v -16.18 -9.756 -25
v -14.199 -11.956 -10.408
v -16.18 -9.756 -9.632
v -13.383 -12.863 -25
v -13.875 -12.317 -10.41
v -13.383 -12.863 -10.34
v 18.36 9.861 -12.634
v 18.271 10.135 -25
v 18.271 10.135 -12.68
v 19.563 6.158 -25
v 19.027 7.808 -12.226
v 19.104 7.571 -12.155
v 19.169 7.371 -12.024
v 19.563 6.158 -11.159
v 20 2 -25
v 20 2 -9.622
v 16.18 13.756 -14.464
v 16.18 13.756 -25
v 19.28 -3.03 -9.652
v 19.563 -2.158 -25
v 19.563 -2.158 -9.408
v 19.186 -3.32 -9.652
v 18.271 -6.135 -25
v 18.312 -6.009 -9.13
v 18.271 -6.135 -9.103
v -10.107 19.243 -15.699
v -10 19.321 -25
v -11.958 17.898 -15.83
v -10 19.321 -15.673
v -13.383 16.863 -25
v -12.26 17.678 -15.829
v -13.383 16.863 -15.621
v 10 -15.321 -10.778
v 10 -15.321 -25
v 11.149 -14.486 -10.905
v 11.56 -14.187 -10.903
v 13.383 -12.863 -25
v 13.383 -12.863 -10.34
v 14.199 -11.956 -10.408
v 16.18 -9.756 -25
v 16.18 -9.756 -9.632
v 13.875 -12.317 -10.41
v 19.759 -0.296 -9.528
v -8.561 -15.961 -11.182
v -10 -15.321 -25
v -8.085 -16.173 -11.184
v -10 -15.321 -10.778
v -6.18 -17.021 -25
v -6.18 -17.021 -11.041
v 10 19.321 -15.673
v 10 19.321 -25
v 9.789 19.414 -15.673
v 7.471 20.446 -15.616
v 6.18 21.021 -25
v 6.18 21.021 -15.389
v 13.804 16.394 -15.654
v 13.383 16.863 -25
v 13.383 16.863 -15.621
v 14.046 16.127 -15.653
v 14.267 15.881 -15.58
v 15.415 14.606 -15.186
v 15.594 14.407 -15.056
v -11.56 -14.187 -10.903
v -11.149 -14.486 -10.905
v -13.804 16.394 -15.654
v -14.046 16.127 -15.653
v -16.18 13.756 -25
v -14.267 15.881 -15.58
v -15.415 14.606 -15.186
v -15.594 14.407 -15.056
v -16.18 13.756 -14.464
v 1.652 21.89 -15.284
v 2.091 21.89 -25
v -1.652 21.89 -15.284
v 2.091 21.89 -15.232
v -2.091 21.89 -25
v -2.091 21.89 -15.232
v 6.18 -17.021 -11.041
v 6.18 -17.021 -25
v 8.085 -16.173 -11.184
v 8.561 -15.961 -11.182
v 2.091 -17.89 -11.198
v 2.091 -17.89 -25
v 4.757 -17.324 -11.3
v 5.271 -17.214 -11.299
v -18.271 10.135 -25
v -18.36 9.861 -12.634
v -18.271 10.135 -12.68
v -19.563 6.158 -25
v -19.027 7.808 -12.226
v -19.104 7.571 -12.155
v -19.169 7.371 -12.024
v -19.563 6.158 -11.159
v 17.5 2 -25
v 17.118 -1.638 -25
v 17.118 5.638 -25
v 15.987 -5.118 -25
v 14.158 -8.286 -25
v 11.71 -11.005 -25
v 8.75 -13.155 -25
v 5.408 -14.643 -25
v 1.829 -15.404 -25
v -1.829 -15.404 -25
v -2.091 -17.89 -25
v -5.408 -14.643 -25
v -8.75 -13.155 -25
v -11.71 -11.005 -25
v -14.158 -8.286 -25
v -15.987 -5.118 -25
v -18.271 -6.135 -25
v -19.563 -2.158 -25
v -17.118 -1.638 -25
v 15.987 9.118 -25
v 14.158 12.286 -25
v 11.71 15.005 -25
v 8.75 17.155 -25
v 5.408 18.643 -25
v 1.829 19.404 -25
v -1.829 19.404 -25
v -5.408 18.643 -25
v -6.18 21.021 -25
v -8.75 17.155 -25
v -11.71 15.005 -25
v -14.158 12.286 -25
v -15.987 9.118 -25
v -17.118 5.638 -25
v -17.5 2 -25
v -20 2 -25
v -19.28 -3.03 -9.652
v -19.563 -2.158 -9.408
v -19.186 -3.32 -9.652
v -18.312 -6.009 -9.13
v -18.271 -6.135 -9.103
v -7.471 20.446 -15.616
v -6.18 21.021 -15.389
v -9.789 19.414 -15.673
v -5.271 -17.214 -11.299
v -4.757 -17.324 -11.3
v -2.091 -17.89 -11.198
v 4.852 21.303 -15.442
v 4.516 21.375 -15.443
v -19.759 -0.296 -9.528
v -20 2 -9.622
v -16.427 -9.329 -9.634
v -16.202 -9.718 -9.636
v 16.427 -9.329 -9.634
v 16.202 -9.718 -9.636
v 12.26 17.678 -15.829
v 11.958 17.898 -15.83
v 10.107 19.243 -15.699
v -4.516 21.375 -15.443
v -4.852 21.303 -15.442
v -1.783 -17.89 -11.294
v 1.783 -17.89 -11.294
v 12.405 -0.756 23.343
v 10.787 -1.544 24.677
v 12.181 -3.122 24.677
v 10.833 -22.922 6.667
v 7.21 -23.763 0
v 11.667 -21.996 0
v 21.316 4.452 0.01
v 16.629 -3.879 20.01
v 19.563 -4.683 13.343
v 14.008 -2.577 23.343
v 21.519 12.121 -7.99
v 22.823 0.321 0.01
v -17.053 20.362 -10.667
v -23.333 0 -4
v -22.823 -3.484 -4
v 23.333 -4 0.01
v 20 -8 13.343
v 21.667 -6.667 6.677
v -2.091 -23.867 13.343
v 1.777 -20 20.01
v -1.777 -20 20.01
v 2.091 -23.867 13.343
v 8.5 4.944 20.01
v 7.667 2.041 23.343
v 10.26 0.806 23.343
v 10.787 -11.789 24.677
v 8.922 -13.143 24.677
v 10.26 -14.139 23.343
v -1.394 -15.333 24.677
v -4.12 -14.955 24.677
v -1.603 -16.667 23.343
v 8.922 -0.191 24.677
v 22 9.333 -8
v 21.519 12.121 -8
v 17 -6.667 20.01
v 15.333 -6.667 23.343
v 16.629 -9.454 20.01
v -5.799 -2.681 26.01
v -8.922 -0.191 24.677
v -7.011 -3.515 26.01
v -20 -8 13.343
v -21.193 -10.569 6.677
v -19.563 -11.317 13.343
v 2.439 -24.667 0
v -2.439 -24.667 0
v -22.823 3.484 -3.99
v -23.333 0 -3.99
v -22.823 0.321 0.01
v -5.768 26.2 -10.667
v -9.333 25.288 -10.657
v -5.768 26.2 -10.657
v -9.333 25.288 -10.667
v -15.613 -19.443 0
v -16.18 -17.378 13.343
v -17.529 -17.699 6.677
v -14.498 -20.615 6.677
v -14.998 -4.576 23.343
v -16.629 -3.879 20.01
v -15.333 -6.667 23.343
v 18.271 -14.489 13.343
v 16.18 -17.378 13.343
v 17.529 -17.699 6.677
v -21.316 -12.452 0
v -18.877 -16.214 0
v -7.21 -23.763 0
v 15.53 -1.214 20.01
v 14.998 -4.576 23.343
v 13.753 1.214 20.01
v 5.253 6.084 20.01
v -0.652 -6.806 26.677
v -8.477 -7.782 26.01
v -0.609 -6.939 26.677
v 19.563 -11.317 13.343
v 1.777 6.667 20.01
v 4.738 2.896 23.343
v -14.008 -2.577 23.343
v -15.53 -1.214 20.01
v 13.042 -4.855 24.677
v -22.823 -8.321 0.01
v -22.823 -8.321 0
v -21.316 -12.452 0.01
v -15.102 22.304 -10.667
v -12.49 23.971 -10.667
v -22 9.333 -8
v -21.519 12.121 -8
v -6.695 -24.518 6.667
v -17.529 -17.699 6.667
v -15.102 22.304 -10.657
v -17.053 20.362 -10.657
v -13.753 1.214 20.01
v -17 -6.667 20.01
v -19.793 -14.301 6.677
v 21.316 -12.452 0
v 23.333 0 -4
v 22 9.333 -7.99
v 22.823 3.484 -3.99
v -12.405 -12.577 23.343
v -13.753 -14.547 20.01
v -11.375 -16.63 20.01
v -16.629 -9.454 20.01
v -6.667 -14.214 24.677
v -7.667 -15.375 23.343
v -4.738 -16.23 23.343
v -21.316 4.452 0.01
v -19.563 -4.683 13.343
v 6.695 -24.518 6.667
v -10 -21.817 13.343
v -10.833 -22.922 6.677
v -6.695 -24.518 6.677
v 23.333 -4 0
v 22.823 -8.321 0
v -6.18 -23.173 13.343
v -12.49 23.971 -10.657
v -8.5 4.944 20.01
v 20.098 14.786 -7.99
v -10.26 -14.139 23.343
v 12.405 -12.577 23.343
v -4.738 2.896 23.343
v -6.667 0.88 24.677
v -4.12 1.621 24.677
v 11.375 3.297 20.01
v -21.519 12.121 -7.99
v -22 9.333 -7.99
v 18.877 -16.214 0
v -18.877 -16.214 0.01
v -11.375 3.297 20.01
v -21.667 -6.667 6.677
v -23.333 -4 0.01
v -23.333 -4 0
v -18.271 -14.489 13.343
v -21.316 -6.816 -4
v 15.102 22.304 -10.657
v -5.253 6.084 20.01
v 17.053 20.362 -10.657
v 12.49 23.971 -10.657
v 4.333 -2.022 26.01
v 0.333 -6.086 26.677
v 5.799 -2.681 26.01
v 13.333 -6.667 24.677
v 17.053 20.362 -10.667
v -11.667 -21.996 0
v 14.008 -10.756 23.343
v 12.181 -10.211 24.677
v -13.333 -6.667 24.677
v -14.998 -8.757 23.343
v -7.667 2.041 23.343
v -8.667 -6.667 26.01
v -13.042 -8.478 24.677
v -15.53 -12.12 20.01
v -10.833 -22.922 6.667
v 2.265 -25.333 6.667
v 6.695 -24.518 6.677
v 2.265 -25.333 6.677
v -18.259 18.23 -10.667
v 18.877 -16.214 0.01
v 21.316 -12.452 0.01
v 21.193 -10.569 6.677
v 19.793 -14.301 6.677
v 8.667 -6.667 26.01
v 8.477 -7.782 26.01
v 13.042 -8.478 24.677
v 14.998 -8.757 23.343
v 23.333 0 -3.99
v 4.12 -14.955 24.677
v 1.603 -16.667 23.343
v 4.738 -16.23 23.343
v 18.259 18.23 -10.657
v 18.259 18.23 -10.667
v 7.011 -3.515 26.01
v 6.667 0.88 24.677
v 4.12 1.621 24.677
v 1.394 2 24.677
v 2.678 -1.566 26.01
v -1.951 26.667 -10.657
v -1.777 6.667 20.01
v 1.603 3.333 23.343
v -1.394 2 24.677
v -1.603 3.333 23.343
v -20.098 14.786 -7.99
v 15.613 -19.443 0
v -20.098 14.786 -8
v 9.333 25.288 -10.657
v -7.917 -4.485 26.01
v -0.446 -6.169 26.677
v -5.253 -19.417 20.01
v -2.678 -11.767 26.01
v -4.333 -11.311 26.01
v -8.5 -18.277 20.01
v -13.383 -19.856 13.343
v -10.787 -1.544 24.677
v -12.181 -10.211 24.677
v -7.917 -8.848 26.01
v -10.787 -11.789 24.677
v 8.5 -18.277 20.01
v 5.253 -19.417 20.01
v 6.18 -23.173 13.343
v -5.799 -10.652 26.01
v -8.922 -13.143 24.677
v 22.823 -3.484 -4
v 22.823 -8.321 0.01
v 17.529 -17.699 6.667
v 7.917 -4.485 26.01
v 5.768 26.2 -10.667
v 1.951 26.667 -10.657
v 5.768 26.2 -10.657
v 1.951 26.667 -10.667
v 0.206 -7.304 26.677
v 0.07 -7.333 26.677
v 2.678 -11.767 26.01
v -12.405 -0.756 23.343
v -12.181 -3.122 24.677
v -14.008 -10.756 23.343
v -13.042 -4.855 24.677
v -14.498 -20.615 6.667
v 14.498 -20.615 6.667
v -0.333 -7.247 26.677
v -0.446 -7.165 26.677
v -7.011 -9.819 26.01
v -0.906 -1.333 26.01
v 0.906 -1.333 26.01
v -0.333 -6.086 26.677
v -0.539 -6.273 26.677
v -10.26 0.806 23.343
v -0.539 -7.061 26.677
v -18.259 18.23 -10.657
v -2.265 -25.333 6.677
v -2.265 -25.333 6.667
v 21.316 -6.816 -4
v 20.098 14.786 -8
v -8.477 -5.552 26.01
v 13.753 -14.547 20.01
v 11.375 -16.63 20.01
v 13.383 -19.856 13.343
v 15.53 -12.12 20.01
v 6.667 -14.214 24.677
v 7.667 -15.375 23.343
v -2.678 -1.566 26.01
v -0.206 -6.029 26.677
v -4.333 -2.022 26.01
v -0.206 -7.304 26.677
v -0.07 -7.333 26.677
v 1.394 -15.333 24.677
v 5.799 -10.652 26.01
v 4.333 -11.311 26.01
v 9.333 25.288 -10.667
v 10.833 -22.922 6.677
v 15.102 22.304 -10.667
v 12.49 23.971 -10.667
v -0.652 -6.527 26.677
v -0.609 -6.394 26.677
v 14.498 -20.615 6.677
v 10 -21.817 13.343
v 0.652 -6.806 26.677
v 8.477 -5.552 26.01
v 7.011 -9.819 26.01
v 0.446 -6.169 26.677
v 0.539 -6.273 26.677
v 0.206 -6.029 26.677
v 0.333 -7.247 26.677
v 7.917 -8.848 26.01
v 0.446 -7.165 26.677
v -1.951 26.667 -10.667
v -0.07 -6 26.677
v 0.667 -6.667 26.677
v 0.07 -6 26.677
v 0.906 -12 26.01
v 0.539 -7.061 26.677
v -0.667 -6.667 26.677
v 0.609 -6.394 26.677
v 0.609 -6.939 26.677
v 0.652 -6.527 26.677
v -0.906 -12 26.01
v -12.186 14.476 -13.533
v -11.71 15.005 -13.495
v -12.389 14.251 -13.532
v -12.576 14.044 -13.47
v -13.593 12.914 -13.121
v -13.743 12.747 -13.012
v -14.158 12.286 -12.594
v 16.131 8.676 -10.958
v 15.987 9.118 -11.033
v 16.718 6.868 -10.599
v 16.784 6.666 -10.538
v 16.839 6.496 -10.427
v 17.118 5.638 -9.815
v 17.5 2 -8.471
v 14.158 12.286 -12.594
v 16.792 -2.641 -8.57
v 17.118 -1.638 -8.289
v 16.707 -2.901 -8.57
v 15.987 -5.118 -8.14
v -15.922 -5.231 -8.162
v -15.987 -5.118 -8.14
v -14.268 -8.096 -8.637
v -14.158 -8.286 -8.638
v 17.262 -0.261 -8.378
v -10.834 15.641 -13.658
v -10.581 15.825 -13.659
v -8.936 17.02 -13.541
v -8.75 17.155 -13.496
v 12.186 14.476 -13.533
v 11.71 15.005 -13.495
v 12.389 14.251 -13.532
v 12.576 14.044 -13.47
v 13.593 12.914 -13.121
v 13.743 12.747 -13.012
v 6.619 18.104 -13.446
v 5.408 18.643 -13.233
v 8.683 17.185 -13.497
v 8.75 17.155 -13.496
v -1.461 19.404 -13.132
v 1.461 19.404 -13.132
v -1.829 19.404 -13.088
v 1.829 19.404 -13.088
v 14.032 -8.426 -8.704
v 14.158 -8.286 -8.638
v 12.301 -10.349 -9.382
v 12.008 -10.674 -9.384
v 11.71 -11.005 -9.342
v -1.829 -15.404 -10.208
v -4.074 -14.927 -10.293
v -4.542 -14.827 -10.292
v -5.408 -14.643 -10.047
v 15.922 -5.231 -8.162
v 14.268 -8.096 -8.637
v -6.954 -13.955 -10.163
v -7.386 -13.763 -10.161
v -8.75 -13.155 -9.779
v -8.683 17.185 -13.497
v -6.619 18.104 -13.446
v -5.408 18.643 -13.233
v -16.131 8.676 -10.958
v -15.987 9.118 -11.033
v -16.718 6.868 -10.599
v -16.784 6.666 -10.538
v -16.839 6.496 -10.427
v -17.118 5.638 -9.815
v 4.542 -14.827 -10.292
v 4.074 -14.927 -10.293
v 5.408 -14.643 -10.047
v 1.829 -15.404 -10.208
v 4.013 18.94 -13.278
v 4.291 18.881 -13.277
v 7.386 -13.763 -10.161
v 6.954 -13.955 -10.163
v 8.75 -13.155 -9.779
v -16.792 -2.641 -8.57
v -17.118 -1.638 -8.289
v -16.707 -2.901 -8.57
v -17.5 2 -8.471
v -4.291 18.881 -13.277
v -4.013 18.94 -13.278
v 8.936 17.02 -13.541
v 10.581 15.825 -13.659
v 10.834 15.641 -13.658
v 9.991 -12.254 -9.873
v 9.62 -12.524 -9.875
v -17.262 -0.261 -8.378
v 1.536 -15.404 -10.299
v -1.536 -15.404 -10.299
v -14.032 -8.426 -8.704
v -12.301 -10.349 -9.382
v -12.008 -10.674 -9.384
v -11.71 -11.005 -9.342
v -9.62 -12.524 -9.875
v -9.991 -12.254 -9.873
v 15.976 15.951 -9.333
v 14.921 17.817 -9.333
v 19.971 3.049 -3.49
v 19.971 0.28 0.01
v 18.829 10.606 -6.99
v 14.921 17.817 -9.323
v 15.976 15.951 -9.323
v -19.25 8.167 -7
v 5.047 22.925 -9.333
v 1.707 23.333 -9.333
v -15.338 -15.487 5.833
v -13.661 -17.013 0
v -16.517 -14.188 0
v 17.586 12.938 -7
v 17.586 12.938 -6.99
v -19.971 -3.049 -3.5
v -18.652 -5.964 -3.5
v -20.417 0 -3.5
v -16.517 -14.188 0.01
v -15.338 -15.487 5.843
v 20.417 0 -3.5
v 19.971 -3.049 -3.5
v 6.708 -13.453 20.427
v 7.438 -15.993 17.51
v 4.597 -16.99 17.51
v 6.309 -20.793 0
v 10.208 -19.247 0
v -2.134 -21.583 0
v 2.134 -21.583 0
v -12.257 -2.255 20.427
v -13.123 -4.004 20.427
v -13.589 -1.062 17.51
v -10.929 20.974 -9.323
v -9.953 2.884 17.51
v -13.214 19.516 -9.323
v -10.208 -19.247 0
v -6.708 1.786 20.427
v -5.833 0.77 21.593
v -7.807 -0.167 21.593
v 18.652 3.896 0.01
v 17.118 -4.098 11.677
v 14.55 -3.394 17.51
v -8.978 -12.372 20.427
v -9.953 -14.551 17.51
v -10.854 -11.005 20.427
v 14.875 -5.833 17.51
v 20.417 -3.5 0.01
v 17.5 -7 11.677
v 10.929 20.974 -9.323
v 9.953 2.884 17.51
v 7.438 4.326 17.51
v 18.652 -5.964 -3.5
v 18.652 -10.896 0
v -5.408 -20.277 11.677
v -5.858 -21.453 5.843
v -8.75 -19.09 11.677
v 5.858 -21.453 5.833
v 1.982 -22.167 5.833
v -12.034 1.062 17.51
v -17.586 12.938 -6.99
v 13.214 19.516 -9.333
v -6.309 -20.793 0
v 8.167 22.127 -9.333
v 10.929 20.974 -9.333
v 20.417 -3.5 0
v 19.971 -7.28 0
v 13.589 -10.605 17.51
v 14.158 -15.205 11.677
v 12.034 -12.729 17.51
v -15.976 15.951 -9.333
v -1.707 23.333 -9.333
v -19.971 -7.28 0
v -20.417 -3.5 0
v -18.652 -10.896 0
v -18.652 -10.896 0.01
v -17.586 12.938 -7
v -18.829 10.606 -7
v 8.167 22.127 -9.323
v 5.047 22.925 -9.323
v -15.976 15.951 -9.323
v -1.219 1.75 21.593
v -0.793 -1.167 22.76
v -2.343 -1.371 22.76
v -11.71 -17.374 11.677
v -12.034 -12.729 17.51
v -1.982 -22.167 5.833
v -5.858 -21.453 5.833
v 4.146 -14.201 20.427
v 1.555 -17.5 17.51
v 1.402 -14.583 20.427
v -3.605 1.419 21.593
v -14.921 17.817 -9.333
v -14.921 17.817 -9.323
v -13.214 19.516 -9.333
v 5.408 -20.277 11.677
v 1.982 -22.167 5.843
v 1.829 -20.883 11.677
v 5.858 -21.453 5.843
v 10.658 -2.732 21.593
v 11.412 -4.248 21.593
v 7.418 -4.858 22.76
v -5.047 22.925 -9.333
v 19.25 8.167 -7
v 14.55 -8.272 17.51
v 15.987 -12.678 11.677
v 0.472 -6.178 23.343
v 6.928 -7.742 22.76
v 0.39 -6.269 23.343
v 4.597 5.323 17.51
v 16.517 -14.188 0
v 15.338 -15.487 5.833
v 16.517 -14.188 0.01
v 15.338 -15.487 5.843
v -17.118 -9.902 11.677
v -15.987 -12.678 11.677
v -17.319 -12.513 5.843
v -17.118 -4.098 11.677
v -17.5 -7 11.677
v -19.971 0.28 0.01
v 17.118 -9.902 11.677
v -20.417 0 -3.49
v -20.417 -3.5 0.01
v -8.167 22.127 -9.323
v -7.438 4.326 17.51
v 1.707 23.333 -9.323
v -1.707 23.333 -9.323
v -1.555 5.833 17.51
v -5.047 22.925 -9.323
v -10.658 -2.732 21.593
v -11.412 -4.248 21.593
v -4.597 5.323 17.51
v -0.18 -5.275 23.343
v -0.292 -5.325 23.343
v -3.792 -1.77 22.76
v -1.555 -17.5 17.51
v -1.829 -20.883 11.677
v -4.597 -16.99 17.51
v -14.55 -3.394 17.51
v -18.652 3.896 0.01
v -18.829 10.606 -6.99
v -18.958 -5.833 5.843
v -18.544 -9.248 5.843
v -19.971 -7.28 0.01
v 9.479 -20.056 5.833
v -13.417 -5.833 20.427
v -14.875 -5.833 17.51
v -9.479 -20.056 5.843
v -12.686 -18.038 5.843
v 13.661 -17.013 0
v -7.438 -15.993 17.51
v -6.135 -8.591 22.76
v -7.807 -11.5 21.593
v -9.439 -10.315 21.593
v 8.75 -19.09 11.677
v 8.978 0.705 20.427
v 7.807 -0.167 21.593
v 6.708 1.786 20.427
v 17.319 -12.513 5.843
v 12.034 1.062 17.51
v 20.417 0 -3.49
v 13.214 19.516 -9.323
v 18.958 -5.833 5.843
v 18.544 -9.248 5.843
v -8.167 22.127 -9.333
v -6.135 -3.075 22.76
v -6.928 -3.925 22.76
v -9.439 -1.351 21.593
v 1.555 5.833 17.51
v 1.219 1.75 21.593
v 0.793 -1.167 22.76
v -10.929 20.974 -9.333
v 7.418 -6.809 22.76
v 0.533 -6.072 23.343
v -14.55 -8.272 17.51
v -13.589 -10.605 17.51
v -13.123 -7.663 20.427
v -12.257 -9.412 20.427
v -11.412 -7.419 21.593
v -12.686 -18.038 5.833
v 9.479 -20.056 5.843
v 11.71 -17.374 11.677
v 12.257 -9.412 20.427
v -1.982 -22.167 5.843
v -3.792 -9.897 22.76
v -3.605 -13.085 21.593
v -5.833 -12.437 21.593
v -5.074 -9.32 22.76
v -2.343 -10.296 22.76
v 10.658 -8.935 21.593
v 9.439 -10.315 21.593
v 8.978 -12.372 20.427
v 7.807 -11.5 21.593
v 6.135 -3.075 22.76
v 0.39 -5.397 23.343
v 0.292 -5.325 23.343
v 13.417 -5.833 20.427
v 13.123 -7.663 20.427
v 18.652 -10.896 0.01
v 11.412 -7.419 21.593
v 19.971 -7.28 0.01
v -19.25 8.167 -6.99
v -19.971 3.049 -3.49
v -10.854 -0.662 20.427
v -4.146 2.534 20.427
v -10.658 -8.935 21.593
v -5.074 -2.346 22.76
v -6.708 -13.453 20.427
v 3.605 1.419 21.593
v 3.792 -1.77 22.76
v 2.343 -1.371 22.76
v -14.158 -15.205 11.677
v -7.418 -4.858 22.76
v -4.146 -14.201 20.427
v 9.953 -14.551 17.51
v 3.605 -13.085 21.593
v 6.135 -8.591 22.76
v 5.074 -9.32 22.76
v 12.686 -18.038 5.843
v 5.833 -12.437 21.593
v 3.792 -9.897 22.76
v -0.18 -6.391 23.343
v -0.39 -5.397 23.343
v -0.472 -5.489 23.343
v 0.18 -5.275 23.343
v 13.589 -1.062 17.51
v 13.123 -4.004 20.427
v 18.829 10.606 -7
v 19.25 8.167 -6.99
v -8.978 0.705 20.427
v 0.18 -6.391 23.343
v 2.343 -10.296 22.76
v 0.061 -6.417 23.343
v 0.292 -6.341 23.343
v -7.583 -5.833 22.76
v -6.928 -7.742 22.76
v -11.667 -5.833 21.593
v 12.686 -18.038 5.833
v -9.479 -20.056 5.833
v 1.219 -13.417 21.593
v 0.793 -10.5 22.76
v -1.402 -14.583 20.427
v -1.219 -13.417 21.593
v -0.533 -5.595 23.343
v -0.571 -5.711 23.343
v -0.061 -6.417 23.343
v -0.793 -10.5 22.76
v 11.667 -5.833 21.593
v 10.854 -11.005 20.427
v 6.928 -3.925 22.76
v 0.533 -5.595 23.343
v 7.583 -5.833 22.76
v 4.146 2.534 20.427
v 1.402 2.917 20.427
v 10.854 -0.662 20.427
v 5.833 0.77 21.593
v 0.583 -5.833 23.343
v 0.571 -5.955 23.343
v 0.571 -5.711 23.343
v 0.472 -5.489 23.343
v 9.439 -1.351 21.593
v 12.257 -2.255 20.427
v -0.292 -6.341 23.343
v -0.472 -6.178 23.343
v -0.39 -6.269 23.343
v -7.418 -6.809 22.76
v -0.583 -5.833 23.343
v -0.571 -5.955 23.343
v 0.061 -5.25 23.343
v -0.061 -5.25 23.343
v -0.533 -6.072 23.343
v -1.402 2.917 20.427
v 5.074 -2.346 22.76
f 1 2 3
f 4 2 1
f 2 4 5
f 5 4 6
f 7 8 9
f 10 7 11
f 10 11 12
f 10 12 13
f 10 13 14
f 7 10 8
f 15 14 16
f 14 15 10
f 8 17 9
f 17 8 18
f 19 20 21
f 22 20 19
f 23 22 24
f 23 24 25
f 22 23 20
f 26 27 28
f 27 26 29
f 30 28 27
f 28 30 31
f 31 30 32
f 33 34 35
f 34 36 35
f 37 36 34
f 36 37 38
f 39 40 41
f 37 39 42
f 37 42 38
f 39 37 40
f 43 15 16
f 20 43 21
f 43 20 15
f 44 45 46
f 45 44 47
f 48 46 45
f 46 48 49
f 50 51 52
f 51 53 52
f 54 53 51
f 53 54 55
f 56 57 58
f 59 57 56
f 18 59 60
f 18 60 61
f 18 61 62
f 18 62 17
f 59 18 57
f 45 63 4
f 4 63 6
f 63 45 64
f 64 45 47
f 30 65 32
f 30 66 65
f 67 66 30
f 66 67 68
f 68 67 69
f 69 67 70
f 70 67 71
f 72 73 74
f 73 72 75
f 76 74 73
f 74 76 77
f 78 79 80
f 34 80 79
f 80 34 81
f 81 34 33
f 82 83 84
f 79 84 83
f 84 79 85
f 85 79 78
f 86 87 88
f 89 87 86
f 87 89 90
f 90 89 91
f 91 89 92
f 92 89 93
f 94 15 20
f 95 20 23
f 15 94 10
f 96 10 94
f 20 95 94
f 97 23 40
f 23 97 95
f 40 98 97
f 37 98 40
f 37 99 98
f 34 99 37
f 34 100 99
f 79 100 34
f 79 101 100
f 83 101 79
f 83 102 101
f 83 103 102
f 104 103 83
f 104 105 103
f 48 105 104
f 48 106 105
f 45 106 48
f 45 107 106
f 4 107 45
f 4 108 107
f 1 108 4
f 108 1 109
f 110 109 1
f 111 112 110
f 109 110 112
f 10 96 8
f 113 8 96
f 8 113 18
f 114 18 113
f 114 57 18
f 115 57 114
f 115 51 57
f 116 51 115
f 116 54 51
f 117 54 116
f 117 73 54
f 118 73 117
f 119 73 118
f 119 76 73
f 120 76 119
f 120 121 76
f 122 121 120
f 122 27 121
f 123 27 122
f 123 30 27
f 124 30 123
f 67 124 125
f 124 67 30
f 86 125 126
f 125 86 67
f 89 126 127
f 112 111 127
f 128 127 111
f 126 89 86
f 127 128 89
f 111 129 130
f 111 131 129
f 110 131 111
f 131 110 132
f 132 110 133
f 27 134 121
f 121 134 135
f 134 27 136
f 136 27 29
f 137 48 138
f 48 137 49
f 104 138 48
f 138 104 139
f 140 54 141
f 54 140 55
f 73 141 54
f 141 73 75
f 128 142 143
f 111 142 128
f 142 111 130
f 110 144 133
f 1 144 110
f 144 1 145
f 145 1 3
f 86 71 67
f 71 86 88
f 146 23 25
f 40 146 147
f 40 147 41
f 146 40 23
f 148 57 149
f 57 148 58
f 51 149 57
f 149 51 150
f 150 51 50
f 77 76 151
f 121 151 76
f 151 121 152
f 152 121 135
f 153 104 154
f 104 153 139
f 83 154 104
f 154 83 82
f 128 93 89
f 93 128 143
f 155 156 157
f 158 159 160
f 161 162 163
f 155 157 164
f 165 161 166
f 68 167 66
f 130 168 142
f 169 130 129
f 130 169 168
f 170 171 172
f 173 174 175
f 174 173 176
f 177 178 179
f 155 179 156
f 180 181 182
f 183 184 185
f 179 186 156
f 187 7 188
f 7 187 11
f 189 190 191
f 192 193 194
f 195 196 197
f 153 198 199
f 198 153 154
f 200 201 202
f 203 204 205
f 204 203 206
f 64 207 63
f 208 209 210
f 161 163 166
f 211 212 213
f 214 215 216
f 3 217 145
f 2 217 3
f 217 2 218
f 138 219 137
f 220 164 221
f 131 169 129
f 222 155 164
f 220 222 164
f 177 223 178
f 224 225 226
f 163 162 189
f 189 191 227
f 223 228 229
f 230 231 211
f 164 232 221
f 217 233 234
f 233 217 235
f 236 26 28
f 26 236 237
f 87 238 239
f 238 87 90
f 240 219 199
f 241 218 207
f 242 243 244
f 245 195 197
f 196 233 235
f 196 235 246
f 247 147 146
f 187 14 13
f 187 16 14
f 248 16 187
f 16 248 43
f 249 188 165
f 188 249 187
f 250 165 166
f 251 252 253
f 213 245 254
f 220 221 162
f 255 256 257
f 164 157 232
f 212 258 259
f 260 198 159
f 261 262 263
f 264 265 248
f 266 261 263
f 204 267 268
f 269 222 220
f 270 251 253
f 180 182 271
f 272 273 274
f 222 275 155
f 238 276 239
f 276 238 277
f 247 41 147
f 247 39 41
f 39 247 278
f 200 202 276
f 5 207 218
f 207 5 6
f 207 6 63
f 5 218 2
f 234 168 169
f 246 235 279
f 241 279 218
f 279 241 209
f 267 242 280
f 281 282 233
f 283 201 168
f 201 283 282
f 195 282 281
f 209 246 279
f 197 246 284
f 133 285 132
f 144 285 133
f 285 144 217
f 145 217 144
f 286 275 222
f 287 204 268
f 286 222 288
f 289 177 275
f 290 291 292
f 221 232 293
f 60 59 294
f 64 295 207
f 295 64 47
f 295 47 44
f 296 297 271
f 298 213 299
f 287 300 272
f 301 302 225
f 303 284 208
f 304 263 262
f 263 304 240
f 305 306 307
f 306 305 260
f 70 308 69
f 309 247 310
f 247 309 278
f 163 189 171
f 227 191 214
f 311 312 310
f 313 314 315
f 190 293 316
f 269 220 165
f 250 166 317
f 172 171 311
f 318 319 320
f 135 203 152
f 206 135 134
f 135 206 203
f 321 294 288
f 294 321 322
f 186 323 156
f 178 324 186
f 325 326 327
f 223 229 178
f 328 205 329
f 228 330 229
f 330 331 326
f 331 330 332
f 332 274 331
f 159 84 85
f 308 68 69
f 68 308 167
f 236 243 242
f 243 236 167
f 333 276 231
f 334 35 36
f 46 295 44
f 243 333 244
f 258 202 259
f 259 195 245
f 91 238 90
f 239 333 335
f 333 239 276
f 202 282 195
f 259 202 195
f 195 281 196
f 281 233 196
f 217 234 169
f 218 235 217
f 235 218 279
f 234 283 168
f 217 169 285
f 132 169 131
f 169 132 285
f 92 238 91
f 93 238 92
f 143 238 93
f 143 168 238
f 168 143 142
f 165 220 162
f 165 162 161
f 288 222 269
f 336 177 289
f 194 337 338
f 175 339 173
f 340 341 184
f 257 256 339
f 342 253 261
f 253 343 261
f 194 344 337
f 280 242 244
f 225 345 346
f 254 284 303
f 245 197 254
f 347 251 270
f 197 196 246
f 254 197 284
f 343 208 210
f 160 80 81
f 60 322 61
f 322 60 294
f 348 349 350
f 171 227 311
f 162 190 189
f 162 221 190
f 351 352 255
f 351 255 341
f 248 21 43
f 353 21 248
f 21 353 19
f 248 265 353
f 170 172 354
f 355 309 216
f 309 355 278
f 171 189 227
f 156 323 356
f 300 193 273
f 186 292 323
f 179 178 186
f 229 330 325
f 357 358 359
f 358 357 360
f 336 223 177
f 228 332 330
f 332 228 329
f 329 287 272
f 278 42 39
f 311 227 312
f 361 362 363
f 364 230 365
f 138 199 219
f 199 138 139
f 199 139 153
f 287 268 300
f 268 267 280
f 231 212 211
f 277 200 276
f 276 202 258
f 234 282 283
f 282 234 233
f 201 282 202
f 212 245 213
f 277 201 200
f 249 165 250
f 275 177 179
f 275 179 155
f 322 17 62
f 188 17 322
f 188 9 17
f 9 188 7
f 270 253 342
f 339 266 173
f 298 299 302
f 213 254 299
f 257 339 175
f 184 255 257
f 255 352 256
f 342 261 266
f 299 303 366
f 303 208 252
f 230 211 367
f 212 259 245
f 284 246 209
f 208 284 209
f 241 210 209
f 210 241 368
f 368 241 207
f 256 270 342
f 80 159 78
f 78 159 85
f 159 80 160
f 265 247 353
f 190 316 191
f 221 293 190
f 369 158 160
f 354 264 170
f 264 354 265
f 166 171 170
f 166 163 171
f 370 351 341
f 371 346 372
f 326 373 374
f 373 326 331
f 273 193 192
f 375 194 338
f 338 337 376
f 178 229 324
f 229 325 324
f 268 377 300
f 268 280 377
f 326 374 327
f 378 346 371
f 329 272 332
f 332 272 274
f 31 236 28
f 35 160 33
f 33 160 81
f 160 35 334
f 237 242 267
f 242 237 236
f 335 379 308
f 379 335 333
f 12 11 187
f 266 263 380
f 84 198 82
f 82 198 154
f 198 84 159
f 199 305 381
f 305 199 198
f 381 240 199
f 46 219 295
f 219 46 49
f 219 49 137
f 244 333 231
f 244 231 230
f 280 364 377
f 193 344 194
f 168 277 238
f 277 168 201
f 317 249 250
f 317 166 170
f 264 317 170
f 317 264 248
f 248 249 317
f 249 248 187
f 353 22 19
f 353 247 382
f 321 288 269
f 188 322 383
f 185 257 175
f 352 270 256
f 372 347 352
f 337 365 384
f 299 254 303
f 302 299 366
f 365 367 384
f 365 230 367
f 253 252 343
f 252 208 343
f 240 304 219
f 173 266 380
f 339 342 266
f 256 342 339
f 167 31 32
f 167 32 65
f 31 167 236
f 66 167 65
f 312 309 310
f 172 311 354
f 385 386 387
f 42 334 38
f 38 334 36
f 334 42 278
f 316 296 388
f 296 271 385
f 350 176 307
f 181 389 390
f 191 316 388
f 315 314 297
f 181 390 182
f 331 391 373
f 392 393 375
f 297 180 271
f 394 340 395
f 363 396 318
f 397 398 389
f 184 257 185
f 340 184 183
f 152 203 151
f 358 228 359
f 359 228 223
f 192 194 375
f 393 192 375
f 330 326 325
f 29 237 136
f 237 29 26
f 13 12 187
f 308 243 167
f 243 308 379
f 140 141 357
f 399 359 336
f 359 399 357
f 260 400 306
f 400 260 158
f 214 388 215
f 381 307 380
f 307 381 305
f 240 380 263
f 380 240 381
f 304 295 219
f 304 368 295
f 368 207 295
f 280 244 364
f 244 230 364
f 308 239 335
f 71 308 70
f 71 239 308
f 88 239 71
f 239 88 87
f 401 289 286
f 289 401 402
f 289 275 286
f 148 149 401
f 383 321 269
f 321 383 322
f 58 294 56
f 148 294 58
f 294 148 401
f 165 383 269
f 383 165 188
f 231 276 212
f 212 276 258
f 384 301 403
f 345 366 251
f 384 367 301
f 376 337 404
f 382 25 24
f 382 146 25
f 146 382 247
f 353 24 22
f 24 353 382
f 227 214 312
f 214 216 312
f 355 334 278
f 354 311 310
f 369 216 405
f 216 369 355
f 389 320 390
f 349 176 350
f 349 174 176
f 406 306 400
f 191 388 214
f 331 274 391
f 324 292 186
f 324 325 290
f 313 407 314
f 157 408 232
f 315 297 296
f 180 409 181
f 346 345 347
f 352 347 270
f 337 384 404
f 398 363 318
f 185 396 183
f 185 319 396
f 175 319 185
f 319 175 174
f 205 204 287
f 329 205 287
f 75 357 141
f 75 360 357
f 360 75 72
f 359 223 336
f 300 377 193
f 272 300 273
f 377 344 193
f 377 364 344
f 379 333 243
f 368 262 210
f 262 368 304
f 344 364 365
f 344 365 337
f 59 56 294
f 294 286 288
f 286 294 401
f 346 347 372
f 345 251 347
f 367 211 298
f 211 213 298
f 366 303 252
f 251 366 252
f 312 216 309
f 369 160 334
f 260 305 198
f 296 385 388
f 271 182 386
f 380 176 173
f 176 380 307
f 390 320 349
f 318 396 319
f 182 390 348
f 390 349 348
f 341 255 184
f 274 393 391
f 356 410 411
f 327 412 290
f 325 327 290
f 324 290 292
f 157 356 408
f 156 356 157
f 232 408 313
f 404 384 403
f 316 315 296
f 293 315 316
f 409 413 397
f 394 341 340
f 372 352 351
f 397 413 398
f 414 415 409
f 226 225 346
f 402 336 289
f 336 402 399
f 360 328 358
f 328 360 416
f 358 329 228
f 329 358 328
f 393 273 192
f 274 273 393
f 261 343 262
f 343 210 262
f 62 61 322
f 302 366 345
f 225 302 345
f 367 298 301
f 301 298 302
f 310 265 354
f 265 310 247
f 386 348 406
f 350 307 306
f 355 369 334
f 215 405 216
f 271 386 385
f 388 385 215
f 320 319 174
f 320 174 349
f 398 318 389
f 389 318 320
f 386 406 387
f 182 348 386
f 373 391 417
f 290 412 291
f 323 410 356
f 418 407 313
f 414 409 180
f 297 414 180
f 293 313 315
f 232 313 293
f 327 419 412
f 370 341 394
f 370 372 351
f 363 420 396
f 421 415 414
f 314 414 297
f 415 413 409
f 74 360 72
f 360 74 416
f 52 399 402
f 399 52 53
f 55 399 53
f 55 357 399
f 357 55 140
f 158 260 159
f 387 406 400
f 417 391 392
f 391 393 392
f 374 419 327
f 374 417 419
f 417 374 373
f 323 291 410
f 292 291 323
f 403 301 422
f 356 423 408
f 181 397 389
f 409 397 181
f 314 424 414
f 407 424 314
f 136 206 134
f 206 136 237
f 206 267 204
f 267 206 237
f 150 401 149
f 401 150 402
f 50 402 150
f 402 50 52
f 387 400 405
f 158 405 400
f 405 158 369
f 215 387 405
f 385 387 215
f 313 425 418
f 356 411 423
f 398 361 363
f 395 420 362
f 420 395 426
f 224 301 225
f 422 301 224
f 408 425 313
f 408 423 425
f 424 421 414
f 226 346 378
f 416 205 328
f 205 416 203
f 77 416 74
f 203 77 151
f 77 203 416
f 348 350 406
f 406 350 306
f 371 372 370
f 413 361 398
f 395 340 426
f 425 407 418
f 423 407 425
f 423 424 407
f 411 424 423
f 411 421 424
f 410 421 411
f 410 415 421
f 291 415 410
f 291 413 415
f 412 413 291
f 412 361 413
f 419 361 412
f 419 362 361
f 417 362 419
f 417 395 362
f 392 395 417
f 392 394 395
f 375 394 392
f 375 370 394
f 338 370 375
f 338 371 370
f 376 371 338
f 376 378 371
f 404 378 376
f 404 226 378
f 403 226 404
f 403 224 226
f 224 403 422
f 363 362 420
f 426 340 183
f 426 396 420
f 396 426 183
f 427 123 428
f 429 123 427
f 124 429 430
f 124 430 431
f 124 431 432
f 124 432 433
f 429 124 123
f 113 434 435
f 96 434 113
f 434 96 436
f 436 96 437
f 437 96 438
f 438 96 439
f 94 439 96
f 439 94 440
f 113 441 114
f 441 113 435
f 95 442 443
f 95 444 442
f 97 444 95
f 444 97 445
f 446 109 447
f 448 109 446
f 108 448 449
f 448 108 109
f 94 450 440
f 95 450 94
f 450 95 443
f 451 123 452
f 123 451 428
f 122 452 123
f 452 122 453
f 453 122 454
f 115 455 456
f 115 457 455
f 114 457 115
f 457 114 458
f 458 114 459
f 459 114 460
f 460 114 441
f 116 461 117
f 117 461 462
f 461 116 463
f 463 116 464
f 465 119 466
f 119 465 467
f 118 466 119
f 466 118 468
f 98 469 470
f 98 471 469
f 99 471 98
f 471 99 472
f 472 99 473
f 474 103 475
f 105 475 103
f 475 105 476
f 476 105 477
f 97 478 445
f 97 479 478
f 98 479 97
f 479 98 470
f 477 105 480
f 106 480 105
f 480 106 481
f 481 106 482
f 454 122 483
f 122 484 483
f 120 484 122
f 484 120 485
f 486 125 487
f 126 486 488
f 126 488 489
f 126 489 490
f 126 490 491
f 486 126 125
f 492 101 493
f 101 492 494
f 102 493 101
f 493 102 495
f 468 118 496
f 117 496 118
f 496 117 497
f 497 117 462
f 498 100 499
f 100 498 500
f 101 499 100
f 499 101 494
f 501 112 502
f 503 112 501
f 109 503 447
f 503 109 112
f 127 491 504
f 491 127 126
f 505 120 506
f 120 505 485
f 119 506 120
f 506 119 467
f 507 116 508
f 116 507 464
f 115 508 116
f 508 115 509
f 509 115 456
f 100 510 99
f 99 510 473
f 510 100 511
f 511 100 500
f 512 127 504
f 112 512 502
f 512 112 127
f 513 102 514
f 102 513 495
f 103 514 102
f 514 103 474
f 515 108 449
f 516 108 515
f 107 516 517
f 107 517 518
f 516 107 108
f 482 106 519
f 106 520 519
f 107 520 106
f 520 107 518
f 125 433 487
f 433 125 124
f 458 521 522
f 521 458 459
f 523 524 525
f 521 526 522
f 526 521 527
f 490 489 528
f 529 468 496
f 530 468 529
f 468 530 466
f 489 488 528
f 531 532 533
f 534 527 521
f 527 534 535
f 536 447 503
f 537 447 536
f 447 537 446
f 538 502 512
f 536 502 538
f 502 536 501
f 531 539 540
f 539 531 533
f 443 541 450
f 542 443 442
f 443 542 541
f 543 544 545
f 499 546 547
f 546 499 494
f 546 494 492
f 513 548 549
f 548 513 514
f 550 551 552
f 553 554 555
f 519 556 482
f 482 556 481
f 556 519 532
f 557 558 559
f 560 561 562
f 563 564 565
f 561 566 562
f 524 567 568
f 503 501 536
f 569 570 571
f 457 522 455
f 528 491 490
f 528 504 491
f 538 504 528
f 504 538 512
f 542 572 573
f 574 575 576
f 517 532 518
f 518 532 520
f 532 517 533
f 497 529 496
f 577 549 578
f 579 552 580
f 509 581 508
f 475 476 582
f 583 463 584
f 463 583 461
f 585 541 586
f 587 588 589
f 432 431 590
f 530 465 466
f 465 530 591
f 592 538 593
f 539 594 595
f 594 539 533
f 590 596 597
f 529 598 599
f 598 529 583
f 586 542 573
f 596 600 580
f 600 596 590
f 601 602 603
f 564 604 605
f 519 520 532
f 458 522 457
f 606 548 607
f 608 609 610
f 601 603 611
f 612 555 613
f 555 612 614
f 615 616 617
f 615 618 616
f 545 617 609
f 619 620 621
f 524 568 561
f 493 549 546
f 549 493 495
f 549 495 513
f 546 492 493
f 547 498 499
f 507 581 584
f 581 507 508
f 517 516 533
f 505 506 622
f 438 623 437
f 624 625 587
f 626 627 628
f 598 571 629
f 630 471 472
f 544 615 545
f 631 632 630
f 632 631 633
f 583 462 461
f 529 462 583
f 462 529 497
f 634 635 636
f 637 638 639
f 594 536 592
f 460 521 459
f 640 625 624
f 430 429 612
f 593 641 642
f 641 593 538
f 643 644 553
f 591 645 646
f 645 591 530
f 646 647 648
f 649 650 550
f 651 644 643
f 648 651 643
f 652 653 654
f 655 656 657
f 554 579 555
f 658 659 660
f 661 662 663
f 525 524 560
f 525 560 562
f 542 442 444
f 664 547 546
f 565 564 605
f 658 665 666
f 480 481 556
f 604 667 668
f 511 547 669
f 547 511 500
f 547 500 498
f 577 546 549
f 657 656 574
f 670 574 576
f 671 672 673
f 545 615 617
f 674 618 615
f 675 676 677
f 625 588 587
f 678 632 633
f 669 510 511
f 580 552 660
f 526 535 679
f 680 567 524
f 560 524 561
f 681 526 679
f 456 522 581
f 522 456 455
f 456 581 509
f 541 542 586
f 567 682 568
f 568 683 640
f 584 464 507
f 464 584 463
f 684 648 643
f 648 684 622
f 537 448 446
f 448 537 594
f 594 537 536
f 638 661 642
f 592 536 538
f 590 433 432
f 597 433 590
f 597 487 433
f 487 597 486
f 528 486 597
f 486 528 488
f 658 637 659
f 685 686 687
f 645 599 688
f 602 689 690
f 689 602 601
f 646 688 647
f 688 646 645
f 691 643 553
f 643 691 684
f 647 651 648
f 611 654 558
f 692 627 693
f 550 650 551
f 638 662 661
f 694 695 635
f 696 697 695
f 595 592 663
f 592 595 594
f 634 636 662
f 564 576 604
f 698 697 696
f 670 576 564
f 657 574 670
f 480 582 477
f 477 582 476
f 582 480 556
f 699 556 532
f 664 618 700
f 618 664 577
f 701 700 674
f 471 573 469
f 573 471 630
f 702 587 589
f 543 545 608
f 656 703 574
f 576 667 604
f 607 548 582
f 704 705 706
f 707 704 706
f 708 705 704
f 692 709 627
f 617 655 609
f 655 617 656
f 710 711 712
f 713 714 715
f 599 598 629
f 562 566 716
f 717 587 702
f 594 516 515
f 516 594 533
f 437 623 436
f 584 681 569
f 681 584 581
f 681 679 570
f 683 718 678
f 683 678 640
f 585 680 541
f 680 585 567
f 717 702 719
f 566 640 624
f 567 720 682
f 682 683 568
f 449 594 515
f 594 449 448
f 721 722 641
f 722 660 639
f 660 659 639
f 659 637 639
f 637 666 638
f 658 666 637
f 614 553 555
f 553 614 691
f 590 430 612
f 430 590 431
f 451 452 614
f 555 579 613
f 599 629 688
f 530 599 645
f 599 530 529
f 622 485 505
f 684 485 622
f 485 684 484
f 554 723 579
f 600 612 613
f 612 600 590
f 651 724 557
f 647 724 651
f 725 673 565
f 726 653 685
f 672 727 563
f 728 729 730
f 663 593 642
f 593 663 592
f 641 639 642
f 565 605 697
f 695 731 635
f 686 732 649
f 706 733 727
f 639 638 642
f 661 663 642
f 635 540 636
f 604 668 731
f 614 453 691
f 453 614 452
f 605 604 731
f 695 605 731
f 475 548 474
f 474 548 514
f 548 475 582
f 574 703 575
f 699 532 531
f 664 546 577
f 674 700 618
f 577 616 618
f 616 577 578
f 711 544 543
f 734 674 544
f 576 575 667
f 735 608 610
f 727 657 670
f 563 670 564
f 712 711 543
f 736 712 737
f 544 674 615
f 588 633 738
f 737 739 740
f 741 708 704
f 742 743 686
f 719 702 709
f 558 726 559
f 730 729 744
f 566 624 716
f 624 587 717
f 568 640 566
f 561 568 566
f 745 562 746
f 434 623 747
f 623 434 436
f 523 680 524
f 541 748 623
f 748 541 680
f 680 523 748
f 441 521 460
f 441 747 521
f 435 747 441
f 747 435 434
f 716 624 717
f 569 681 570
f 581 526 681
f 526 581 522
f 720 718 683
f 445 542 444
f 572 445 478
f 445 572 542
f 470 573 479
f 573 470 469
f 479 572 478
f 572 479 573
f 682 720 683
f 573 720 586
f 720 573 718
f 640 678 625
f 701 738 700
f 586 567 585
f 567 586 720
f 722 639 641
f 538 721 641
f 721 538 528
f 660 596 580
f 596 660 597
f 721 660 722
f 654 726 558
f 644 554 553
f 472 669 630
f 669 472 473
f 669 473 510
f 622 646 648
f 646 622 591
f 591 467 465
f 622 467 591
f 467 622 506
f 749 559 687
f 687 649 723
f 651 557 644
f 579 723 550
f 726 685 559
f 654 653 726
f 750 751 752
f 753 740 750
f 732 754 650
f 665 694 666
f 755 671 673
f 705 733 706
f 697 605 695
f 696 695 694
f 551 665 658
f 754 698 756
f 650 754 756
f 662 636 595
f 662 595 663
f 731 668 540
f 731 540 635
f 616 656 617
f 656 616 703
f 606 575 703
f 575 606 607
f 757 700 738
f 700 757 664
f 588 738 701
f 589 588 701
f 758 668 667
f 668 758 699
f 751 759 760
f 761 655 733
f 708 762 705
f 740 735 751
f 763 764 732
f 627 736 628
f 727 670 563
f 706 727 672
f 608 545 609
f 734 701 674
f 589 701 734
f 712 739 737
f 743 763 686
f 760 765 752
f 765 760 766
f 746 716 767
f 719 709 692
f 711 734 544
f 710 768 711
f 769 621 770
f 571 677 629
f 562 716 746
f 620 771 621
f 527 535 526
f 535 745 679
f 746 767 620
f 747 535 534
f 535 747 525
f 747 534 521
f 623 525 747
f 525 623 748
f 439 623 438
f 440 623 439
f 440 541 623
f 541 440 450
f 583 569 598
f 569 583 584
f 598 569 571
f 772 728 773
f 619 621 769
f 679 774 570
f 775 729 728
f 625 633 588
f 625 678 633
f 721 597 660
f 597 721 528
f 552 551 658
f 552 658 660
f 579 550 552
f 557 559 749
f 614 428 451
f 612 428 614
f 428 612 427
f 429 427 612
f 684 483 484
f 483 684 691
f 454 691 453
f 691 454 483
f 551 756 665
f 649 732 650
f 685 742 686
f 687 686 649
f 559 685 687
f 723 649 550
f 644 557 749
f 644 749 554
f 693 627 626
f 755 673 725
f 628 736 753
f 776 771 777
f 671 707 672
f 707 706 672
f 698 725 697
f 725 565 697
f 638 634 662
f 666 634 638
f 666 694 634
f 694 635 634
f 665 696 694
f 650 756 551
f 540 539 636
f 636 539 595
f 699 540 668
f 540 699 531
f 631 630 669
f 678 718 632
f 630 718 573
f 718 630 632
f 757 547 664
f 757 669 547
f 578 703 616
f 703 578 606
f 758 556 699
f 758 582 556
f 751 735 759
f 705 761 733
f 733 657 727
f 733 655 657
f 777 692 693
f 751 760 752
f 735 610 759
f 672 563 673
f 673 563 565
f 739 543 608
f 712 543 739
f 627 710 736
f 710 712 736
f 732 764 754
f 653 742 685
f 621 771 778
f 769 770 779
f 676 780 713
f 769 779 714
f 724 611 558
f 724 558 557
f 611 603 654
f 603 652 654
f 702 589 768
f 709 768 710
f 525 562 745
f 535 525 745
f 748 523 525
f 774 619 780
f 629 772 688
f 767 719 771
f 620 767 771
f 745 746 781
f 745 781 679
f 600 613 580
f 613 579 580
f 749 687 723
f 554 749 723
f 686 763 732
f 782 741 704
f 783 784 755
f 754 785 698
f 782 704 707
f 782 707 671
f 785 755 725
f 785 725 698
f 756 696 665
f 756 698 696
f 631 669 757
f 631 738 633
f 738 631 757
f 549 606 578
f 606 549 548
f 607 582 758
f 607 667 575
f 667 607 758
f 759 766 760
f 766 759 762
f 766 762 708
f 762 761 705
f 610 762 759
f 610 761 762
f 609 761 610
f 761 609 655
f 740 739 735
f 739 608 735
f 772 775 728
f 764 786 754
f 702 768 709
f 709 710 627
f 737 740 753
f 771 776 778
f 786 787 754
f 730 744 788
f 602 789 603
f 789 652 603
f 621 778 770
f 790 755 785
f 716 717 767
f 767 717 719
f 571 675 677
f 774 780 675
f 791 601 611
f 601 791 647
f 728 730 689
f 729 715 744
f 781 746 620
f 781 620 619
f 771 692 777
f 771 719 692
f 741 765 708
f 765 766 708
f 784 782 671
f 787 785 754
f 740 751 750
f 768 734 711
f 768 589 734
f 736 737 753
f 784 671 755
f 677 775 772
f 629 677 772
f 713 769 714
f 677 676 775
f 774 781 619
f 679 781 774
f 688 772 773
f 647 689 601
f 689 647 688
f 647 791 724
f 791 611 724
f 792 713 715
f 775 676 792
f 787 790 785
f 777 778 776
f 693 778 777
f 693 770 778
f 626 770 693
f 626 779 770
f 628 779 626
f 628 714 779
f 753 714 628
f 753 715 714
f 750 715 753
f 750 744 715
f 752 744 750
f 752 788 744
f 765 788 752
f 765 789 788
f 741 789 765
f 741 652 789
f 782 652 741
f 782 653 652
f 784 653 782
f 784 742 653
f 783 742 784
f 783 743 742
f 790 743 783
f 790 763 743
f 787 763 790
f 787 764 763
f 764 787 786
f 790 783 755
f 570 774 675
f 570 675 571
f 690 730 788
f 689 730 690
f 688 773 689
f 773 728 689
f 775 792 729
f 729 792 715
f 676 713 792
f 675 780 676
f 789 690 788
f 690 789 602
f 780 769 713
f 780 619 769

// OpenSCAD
// fl sh 32.5 x 32.5 head 3.75 x 3.25
glansData = [ // yShift, z, x, y
[0, -22.5, 10 , 10],
[12, -8, 28 , 16],
[7, -6, 33 , 20],
[0, -3, 35 , 25],
[-3, 0, 35 , 31],
[-5, 5, 32.5 , 28],
[-6, 10, 30 , 23.8],
[-5, 15, 25.5 , 20],
[-5, 17.5, 23 , 15],
[-5, 18.5, 20 , 13],
[-5, 19.5, 13 , 8],
[-5, 20, 1 , 1],
];

module positionedOval(px, py, pz, lx, ly){
    translate([px, py, pz])
        resize([lx, ly]) cylinder(d=20, h=0.01);
}


module glans(gd, gf){// gf x, y , z
    hull(){
        for( i=[0 : len(gd) -1])
            positionedOval(0, gd[i][0] * gf[1], gd[i][1] * gf[2], gd[i][2] * gf[0] , gd[i][3] * gf[1]);   
    } 
}

module shaft(lengte, dikte){
    translate([0, 2, 0]){
        difference() { 
            translate([0, 0, -lengte])
                cylinder(h = lengte, d = dikte);
            translate([0, 23, 10])
                rotate([45, 0, 0])
                    cube(40,center = true);
        }
    }
}

module binnenHolte(glansData, glansFactor, lengte, dikte){
    glans(glansData, glansFactor);
    shaft(lengte, dikte);
}

difference(){
    binnenHolte(glansData, [8/6,8/6,8/6], lengte = 25, dikte = 40);
    binnenHolte(glansData, [7/6, 7/6, 7/6], lengte = 35, dikte = 35);    
}
//binnenHolte(glansData, [1,1,1], lengte = 35, dikte = 30);
